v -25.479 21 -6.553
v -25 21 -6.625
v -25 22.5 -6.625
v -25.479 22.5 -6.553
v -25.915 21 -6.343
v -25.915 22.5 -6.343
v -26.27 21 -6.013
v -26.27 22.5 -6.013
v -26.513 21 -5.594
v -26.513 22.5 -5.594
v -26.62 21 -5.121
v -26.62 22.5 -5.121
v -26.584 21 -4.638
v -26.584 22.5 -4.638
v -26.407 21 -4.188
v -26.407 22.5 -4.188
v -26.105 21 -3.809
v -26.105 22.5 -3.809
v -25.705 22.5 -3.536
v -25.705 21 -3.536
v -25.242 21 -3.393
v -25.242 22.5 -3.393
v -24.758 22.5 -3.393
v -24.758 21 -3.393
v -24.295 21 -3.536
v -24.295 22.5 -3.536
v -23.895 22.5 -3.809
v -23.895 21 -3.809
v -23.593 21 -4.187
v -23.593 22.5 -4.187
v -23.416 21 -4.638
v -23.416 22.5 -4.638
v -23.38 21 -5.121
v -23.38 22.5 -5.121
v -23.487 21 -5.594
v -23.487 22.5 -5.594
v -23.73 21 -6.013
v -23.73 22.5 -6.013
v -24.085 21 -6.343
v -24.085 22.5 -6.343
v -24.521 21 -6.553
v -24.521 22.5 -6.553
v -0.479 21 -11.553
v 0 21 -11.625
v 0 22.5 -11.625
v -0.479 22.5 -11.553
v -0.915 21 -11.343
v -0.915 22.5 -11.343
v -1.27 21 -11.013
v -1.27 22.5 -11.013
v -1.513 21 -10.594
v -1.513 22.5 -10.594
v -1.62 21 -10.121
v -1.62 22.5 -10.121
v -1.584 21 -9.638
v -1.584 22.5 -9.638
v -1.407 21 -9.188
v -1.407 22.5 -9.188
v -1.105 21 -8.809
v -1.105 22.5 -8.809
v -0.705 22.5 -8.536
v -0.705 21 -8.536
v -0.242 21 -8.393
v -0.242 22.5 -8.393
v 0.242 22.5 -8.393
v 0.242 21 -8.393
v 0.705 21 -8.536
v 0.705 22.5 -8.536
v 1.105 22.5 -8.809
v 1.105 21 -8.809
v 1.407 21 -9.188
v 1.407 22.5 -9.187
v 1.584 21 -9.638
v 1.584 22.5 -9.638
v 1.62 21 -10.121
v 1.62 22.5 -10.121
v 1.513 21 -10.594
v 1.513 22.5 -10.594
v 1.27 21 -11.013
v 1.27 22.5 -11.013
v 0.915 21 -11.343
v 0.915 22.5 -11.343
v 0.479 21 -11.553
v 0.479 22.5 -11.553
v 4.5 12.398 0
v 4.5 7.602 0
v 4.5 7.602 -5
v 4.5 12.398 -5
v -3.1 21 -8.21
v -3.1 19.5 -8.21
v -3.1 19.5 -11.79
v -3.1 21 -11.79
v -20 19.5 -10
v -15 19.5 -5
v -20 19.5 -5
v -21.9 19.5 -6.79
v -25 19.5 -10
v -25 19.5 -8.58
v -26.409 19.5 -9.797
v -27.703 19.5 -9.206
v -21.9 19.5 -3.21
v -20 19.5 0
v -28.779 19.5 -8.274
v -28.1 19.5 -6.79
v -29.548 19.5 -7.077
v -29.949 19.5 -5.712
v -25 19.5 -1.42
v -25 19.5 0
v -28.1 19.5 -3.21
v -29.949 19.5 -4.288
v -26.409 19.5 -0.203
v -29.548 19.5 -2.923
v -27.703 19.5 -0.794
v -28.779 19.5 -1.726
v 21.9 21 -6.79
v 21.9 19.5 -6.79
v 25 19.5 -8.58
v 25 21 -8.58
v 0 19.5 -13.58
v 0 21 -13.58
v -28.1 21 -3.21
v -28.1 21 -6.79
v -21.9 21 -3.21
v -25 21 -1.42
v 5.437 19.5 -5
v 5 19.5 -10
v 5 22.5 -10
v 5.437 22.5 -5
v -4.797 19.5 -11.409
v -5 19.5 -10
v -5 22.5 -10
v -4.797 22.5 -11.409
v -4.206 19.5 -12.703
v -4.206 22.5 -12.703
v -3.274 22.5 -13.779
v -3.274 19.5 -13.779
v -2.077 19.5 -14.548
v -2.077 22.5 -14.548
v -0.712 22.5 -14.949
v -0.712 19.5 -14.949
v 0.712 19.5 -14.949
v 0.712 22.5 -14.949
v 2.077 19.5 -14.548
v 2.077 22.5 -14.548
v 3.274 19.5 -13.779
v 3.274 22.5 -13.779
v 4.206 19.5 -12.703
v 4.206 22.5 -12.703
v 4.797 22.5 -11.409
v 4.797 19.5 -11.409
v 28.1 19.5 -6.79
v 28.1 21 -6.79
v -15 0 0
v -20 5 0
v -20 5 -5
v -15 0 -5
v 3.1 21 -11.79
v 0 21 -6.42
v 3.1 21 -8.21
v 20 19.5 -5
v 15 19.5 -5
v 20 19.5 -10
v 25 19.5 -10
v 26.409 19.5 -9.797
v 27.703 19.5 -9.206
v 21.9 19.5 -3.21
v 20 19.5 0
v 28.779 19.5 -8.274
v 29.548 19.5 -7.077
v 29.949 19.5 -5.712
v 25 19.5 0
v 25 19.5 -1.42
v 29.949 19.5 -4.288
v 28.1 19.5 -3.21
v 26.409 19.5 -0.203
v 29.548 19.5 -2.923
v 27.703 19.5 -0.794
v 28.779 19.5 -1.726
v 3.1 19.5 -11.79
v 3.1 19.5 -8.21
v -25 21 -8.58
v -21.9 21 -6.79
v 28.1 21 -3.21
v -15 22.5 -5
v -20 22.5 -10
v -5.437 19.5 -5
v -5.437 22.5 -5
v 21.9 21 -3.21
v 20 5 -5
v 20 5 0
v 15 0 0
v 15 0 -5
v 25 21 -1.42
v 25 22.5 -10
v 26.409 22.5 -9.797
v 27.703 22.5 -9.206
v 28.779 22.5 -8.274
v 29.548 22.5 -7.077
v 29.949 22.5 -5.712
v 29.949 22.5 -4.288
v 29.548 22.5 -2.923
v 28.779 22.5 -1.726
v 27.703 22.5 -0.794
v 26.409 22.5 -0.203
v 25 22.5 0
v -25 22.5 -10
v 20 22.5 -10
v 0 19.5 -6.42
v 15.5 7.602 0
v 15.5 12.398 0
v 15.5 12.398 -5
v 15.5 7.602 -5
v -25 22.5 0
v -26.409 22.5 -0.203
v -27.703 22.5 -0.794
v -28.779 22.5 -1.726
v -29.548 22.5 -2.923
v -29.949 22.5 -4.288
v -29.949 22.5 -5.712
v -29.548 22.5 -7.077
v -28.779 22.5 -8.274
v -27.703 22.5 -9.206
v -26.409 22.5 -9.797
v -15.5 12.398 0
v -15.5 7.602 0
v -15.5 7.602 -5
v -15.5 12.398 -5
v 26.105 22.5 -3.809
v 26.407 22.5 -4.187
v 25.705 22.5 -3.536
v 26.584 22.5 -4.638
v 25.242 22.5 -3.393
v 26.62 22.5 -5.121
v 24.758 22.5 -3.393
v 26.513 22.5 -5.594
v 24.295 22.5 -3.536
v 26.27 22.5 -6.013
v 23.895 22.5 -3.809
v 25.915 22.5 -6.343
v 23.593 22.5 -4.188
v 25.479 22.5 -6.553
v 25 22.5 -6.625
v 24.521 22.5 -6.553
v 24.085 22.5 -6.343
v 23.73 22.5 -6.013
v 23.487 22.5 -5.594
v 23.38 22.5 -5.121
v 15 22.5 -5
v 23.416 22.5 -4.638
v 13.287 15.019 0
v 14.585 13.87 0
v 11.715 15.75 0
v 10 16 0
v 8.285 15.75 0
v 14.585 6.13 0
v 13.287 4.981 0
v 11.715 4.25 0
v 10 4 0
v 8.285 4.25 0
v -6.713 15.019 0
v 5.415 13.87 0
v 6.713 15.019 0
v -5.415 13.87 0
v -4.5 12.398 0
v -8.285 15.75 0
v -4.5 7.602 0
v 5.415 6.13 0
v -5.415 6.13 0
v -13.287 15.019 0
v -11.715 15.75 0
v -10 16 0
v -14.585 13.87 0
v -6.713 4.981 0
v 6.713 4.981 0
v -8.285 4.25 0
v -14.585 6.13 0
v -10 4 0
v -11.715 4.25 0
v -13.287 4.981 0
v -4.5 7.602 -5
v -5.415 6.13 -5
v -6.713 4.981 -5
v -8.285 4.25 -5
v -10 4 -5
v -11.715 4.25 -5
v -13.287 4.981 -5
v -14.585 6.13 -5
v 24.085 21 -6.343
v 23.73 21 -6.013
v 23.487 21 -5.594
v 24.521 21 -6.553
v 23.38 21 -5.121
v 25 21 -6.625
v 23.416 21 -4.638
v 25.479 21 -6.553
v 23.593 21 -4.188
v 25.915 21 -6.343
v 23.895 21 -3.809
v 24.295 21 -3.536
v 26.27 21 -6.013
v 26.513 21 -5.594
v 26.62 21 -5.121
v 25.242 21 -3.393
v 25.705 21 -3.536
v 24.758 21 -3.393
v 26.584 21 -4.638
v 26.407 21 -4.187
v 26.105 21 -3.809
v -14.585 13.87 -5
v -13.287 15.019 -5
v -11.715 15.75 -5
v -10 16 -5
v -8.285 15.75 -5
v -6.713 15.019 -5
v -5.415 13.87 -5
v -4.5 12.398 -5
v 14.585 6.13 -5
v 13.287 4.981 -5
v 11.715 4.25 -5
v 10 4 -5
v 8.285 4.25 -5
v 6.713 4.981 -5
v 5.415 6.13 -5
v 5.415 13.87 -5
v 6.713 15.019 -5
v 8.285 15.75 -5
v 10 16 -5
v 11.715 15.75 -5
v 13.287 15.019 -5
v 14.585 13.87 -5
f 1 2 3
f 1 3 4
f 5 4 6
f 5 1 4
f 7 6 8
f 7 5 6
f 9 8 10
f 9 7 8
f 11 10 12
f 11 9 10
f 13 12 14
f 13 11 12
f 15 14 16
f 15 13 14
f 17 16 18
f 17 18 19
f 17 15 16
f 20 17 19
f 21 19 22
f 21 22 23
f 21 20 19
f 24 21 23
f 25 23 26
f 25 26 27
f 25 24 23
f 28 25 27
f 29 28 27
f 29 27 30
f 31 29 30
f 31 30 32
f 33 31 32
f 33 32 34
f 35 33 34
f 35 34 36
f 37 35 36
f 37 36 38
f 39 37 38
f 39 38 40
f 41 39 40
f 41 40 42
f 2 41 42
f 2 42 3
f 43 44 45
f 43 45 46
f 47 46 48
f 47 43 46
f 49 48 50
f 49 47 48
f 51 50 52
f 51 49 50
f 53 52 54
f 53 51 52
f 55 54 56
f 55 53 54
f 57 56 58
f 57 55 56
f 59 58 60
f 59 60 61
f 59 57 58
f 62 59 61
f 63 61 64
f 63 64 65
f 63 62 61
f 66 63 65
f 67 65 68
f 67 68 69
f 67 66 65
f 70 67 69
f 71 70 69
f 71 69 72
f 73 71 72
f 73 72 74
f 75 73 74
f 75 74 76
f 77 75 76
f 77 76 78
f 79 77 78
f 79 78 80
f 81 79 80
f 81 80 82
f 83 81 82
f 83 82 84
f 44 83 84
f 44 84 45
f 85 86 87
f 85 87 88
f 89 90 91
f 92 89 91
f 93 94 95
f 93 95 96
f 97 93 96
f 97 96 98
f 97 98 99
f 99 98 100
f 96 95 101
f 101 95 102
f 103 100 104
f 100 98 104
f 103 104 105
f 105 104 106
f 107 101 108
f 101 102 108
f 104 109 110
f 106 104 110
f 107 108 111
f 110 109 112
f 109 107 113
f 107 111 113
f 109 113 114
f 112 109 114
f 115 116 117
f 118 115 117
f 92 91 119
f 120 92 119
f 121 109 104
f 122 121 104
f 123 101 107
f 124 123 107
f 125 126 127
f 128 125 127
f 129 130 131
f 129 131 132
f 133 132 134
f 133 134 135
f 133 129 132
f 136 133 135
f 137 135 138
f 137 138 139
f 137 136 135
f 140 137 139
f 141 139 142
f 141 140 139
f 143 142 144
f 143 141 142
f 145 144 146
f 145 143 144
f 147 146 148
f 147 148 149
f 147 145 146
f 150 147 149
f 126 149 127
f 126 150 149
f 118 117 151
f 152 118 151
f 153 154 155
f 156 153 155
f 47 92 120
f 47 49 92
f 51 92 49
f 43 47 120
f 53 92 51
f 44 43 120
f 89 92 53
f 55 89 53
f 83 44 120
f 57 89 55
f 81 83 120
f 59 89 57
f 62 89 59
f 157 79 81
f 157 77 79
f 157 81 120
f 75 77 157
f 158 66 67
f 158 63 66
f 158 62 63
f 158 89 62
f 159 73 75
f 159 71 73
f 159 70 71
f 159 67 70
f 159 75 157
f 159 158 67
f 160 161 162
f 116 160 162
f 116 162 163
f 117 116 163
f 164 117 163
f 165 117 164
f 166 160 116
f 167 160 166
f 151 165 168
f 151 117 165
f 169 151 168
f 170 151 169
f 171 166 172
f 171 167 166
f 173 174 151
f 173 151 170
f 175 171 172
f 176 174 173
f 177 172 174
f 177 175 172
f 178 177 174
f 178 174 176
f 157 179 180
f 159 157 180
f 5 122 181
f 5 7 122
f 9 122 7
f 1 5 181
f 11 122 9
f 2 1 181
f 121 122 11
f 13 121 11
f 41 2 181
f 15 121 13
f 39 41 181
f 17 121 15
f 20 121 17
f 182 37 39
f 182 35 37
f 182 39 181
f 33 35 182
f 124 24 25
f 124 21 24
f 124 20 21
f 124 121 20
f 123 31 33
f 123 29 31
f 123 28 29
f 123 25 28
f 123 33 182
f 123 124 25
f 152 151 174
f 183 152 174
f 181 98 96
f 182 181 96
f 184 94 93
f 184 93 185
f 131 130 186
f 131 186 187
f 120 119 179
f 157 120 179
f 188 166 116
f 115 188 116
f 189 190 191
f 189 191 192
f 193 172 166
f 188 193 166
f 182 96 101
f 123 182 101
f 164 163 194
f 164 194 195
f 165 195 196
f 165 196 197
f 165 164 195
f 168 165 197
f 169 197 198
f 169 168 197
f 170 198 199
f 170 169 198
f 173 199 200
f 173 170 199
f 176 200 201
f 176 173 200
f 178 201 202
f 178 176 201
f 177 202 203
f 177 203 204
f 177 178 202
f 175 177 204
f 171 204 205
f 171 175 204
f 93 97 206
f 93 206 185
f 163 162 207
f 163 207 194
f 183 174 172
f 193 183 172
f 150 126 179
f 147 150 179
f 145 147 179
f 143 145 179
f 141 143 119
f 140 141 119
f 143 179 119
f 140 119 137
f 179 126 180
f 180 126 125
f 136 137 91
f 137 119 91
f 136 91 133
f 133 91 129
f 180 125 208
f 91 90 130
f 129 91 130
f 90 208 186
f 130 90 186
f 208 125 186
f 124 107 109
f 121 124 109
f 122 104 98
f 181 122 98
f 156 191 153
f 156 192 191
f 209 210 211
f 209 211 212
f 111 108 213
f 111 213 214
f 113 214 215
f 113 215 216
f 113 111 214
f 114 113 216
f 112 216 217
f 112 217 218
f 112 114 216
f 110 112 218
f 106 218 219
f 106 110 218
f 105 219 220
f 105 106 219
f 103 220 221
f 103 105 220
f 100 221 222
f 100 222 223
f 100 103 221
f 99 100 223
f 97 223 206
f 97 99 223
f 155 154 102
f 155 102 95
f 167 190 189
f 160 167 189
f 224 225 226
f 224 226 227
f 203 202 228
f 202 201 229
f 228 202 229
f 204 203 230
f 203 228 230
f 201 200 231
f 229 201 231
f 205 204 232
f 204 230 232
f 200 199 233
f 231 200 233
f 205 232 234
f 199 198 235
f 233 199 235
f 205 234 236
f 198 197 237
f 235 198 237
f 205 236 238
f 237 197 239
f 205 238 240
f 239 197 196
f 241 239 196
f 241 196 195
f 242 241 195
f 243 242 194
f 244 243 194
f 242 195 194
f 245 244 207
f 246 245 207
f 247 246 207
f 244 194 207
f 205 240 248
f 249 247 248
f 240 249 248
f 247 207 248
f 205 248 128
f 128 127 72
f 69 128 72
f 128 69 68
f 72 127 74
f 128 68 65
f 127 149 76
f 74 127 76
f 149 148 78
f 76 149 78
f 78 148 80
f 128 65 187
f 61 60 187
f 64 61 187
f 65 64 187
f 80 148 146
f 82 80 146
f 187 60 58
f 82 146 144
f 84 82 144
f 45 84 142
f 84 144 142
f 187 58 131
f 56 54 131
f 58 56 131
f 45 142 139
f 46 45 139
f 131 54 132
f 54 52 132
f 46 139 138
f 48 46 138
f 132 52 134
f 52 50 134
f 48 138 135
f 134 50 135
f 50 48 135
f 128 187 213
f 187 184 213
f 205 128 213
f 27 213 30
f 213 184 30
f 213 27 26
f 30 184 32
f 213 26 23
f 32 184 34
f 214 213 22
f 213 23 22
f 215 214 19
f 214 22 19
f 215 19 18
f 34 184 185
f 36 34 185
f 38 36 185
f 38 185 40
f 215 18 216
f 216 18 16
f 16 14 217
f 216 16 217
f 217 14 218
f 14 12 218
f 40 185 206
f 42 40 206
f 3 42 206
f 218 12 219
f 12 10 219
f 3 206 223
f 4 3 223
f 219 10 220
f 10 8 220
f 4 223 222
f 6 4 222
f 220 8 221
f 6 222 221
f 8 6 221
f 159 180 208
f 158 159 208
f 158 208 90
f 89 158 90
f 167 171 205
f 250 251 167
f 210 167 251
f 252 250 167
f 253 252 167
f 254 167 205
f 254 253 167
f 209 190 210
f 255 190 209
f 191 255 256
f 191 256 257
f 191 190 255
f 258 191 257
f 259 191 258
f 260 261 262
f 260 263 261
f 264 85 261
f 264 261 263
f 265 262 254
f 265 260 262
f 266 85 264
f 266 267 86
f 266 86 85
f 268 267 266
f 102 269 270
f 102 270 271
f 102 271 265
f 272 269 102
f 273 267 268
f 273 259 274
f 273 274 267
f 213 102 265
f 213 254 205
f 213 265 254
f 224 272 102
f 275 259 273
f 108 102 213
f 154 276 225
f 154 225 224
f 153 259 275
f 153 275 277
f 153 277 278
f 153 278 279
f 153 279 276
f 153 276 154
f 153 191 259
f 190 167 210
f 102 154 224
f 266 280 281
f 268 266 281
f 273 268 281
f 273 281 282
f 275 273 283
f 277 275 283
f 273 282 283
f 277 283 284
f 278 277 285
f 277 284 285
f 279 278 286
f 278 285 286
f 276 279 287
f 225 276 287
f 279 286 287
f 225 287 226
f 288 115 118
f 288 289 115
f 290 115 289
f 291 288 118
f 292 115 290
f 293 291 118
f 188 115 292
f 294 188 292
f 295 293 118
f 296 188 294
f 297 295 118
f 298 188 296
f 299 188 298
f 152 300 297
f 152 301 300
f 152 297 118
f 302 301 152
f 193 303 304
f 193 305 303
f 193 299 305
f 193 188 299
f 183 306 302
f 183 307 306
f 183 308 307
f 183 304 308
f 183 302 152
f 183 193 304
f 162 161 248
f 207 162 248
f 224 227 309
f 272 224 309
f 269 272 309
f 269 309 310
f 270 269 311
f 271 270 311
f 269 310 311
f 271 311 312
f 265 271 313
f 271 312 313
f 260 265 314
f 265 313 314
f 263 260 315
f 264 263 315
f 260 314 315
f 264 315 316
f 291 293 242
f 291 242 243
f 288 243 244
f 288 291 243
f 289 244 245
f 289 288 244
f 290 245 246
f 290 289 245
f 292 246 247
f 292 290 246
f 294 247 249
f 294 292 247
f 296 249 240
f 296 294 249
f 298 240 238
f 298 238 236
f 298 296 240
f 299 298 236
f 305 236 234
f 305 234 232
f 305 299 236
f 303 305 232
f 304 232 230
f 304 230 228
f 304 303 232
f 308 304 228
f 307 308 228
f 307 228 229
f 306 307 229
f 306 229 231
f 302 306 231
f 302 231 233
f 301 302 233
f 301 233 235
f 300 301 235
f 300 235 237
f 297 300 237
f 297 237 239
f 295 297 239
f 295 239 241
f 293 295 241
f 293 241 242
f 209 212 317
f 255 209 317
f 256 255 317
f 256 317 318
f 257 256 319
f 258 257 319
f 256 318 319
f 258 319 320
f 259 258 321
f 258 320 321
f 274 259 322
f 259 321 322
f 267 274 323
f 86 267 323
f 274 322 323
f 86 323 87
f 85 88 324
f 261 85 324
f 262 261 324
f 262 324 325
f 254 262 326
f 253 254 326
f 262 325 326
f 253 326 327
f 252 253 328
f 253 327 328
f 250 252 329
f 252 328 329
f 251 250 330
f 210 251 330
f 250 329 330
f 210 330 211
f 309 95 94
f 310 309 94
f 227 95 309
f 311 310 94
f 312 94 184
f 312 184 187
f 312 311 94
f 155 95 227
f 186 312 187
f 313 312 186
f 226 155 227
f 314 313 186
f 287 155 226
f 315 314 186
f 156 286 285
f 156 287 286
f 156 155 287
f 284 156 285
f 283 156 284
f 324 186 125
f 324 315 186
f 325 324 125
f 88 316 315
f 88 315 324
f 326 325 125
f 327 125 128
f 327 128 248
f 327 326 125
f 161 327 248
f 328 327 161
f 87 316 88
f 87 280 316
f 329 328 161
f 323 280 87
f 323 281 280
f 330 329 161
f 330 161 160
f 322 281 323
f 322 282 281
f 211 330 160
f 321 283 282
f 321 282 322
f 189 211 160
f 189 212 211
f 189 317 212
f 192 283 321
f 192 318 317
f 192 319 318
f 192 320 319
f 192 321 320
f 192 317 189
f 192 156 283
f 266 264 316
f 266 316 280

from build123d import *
from OCP.BRepFilletAPI import BRepFilletAPI_MakeChamfer

# Parameters (mm, degrees)
SKETCH1_R           = 1.625
BOSS_EXTRUDE1_DEPTH = 22.5
SKETCH5_W           = 15
SKETCH5_H           = 5
CUT_EXTRUDE1_DEPTH  = 41.388736054
CUT_EXTRUDE2_DEPTH  = 19.5
CUT_EXTRUDE3_DEPTH  = 39.810436741
CHAMFER1_SIZE       = 5
CHAMFER2_SIZE       = 0.437443318
CHAMFER2_SIZE_2     = 5
CHAMFER3_SIZE       = 5
CUT_EXTRUDE4_DEPTH  = 1.5


with BuildPart() as part:
    # Sketch1 → Boss-Extrude1 (new body)
    with BuildSketch(Plane(origin=(0, 0, 0), x_dir=(1, 0, 0), z_dir=(0, 1, 0))):
        with BuildLine():
            Line((-25, 10), (-5, 10))
            ThreePointArc((-5, 10), (0, 15), (5, 10))
            Line((5, 10), (25, 10))
            ThreePointArc((25, 10), (30, 5), (25, 0))
            Line((25, 0), (-25, 0))
            ThreePointArc((-25, 0), (-30, 5), (-25, 10))
        make_face()
        with Locations(Location((-25, 5, 0), (0, 0, 90))):
            Circle(SKETCH1_R, mode=Mode.SUBTRACT)
        with Locations(Location((25, 5, 0), (0, 0, 90))):
            Circle(SKETCH1_R, mode=Mode.SUBTRACT)
        with Locations(Location((0, 10, 0), (0, 0, 90))):
            Circle(SKETCH1_R, mode=Mode.SUBTRACT)
    extrude(amount=BOSS_EXTRUDE1_DEPTH)

    # Sketch5 → Cut-Extrude1 (cut, through all)
    with BuildSketch(Plane(origin=(0, 0, 0), x_dir=(1, 0, 0), z_dir=(0, 1, 0))):
        with Locations((-12.5, 7.5)):
            Rectangle(SKETCH5_W, SKETCH5_H)
        with Locations((12.5, 7.5)):
            Rectangle(SKETCH5_W, SKETCH5_H)
    extrude(amount=CUT_EXTRUDE1_DEPTH, mode=Mode.SUBTRACT)

    # Sketch6 → Cut-Extrude2 (cut)
    with BuildSketch(Plane.XZ):
        with BuildLine():
            Line((-25, 0), (-20, 0))
            Line((-20, 0), (-20, -10))
            Line((-20, -10), (-25, -10))
            ThreePointArc((-25, -10), (-30, -5), (-25, 0))
        make_face()
        with BuildLine():
            Line((20, 0), (20, -10))
            Line((20, -10), (25, -10))
            ThreePointArc((25, -10), (30, -5), (25, 0))
            Line((25, 0), (20, 0))
        make_face()
        with BuildLine():
            Line((-5, -5), (5, -5))
            Line((5, -5), (5, -10))
            ThreePointArc((5, -10), (0, -15), (-5, -10))
            Line((-5, -10), (-5, -5))
        make_face()
    extrude(amount=-CUT_EXTRUDE2_DEPTH, mode=Mode.SUBTRACT)

    # Sketch7 → Cut-Extrude3 (cut, through all)
    with BuildSketch(Plane(origin=(0, 0, -5), x_dir=(-1, 0, 0), z_dir=(0, 0, -1))):
        with BuildLine():
            Line((4.5, 12.397915762), (4.5, 7.602084238))
            ThreePointArc((4.5, 7.602084238), (10, 4), (15.5, 7.602084238))
            Line((15.5, 7.602084238), (15.5, 12.397915762))
            ThreePointArc((15.5, 12.397915762), (10, 16), (4.5, 12.397915762))
        make_face()
        with BuildLine():
            Line((-15.5, 12.397915762), (-15.5, 7.602084238))
            ThreePointArc((-15.5, 7.602084238), (-10, 4), (-4.5, 7.602084238))
            Line((-4.5, 7.602084238), (-4.5, 12.397915762))
            ThreePointArc((-4.5, 12.397915762), (-10, 16), (-15.5, 12.397915762))
        make_face()
    extrude(amount=-CUT_EXTRUDE3_DEPTH, mode=Mode.SUBTRACT)

    # Chamfer1
    chamfer1_edges = [part.edges().sort_by_distance(p)[0] for p in [
        (-20, 21, -5),
        (20, 21, -5),
    ]]
    chamfer(chamfer1_edges, length=CHAMFER1_SIZE - 0.0001)  # a hair under: the kernel refuses the full size

    # Chamfer2
    chamfer2_edges_1 = [part.edges().sort_by_distance(p)[0] for p in [
        (-5, 21, -5),
    ]]
    chamfer2_side_1 = [part.faces().sort_by_distance(p)[0] for p in [
        (-5.008748866, 21, -5),
    ]]
    chamfer2_edges_2 = [part.edges().sort_by_distance(p)[0] for p in [
        (5, 21, -5),
    ]]
    chamfer2_side_2 = [part.faces().sort_by_distance(p)[0] for p in [
        (5.008748866, 21, -5),
    ]]
    chamfer2 = BRepFilletAPI_MakeChamfer(part.part.solid().wrapped)
    for e in chamfer2_edges_1:
        chamfer2.Add(CHAMFER2_SIZE - 0.0001, CHAMFER2_SIZE_2 - 0.0001, e.wrapped, chamfer2_side_1[0].wrapped)
    for e in chamfer2_edges_2:
        chamfer2.Add(CHAMFER2_SIZE - 0.0001, CHAMFER2_SIZE_2 - 0.0001, e.wrapped, chamfer2_side_2[0].wrapped)
    add(Compound.cast(chamfer2.Shape()), mode=Mode.REPLACE)  # a hair under: the kernel refuses the full size

    # Chamfer3
    chamfer3_edges = [part.edges().sort_by_distance(p)[0] for p in [
        (-20, 0, -2.5),
        (20, 0, -2.5),
    ]]
    chamfer(chamfer3_edges, length=CHAMFER3_SIZE)

    # Sketch8 → Cut-Extrude4 (cut)
    with BuildSketch(Plane.XZ.offset(-19.5)):
        Polygon((25, -8.579571669), (28.1, -6.789785834), (28.1, -3.210214166), (25, -1.420428331), (21.9, -3.210214166), (21.9, -6.789785834), align=None)
        Polygon((0, -13.579571669), (3.1, -11.789785834), (3.1, -8.210214166), (0, -6.420428331), (-3.1, -8.210214166), (-3.1, -11.789785834), align=None)
        Polygon((-25, -8.579571669), (-21.9, -6.789785834), (-21.9, -3.210214166), (-25, -1.420428331), (-28.1, -3.210214166), (-28.1, -6.789785834), align=None)
    extrude(amount=-CUT_EXTRUDE4_DEPTH, mode=Mode.SUBTRACT)


solid = part.part
